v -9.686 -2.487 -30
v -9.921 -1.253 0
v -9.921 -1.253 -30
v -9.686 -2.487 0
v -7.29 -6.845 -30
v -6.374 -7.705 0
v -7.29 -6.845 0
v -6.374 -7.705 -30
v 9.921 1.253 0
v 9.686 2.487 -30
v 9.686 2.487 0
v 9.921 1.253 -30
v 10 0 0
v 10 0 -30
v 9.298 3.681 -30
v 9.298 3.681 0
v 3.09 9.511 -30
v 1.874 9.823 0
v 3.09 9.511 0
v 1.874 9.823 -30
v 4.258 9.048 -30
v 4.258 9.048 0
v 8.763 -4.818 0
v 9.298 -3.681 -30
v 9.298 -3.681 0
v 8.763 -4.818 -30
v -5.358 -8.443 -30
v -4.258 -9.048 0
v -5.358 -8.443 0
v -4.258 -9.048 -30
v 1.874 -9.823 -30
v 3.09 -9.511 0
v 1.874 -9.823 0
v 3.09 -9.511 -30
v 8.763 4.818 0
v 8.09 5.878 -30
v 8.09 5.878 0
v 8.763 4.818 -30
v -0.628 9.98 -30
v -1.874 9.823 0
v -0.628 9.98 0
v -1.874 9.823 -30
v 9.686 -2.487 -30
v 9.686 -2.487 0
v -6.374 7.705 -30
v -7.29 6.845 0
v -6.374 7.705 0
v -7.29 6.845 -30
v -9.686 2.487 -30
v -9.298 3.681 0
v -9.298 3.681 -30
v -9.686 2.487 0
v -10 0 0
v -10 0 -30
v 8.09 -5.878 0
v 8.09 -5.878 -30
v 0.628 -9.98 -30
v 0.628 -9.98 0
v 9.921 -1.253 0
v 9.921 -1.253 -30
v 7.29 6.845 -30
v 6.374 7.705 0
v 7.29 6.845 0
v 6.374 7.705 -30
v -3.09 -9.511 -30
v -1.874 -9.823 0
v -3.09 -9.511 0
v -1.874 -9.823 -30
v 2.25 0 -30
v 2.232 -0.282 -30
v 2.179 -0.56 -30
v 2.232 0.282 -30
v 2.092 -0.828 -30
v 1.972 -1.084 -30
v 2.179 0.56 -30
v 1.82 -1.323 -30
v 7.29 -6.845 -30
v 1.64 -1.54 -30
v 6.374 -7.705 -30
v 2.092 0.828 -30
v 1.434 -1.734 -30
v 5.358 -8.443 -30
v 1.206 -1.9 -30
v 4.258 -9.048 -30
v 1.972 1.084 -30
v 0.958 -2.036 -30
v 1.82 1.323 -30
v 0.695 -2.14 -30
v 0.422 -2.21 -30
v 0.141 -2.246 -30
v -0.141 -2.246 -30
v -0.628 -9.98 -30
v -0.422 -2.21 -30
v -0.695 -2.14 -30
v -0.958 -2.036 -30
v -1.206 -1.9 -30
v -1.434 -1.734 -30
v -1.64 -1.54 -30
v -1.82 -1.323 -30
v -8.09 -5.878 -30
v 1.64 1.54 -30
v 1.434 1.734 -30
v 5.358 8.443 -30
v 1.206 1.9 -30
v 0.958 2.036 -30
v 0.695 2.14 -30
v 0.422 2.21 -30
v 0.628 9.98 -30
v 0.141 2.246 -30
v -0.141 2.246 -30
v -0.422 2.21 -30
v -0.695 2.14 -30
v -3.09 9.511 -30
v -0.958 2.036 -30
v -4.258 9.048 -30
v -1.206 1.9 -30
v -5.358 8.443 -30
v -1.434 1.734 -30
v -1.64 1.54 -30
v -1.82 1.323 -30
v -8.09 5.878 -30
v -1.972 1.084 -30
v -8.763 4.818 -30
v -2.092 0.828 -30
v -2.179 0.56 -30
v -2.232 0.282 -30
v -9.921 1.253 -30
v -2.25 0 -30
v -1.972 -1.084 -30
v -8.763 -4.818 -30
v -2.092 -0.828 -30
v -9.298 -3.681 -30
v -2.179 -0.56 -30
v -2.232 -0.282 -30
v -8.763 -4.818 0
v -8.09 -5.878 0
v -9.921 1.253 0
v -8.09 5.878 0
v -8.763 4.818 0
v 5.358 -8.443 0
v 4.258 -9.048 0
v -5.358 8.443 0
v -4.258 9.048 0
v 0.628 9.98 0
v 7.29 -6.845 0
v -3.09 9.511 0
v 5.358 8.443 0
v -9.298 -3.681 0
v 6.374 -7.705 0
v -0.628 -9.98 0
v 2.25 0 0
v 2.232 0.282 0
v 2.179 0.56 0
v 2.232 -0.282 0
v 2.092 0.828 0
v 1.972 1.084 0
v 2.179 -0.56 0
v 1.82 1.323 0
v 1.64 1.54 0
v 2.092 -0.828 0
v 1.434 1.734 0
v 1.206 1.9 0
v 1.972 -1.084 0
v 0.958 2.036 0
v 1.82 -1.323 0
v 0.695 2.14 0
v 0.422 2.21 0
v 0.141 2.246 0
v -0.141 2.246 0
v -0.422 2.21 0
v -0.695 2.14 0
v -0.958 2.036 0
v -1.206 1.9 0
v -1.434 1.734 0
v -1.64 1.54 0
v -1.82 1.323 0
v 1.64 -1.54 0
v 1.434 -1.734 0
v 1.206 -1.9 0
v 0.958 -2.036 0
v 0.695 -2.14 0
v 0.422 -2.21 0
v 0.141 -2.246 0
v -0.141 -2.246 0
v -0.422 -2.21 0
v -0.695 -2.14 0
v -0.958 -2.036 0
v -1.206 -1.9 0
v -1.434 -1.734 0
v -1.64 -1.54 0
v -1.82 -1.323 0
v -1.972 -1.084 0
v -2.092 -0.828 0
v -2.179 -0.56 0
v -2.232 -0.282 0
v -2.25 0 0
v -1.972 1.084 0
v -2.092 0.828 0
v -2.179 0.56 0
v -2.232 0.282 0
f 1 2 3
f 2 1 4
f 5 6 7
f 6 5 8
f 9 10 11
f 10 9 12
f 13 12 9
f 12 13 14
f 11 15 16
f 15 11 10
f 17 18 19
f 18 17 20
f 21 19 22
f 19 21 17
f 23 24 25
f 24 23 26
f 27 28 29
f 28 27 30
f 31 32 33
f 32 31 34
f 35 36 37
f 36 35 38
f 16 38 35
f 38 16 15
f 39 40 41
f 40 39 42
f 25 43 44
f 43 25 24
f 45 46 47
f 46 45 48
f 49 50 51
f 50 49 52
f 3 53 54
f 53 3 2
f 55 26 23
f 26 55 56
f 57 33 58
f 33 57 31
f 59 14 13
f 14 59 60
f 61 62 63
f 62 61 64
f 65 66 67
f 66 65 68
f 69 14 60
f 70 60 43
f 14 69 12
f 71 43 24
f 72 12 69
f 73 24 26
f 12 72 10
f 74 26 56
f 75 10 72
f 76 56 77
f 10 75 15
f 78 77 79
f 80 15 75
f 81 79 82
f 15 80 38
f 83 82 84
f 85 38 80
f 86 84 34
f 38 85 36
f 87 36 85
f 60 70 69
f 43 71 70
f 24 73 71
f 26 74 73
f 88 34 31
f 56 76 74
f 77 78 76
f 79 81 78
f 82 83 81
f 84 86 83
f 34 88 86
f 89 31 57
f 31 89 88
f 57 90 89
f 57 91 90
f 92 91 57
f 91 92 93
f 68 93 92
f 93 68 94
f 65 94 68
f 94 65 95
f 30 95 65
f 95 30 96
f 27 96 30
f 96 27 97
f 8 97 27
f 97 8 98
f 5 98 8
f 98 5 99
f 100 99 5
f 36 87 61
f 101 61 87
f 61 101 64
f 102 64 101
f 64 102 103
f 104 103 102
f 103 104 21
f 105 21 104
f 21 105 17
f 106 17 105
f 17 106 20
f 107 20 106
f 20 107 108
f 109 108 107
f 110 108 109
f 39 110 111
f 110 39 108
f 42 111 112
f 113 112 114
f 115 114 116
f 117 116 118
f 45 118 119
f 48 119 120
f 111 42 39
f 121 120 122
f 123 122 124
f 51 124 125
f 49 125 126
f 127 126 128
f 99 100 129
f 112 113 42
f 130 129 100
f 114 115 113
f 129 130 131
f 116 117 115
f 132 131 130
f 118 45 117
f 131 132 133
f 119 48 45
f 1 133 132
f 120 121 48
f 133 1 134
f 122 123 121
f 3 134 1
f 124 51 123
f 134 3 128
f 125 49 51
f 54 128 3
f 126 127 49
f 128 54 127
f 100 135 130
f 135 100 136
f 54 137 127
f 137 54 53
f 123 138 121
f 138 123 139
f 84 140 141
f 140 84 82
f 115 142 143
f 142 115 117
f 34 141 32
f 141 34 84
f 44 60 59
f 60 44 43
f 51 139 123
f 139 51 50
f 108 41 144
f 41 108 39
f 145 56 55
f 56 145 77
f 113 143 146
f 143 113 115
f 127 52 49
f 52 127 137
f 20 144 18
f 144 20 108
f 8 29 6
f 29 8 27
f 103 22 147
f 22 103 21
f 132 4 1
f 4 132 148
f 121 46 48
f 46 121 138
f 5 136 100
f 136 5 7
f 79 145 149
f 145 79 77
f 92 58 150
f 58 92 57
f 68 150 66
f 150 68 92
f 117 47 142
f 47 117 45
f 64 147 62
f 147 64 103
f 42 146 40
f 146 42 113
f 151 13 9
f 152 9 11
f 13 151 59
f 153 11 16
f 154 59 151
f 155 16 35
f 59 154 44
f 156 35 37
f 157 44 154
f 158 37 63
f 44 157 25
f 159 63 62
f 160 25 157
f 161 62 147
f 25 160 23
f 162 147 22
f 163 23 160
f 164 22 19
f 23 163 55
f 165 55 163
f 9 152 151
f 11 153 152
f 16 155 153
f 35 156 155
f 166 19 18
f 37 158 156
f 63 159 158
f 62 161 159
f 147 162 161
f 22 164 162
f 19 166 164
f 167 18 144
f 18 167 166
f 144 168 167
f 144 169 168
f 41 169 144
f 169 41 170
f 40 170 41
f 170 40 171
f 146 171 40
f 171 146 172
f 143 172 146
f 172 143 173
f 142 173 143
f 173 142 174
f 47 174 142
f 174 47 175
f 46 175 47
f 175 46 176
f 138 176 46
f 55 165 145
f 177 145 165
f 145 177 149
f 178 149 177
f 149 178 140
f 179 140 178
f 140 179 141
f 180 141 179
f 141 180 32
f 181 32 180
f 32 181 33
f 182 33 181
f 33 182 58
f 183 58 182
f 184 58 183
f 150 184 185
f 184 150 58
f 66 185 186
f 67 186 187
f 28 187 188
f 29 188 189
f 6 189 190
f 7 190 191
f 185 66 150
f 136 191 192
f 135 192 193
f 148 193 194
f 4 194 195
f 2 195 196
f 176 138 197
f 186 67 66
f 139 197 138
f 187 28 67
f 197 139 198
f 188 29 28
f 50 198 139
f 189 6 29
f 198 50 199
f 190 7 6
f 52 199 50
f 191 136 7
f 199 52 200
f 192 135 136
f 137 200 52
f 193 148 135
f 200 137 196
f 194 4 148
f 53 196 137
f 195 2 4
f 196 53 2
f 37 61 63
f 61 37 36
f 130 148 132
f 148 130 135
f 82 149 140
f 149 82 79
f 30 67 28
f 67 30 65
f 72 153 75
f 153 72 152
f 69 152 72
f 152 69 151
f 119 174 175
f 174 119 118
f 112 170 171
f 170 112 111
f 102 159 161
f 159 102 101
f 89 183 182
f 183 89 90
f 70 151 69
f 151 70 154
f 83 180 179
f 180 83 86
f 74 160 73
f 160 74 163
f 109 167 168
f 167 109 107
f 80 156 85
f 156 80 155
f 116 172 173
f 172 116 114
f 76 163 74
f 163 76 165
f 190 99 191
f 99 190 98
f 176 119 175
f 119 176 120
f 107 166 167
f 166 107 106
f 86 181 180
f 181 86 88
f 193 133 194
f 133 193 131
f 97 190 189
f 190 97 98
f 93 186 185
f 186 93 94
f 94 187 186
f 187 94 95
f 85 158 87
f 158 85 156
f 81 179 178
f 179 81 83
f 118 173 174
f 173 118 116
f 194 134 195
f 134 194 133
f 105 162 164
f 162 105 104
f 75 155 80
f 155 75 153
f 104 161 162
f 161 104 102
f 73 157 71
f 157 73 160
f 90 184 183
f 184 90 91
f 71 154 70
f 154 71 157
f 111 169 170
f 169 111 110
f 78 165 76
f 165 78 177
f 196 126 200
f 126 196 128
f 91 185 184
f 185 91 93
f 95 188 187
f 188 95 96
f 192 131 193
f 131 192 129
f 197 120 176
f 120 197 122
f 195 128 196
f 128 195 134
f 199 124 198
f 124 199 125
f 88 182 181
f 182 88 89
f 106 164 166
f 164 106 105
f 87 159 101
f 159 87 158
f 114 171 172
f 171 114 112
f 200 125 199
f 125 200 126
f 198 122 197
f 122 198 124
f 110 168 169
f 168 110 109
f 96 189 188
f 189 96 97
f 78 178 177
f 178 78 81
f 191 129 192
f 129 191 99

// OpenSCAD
$fn = 50;


difference() {
	union() {
		translate(v = [0, 0, -30.0000000000]) {
			cylinder(h = 30, r = 10.0000000000);
		}
		cylinder(h = 0, r = 20.0000000000);
	}
	union() {
		#translate(v = [0, 0, -30]) {
			cylinder(h = 30, r = 2.2500000000);
		}
	}
}
